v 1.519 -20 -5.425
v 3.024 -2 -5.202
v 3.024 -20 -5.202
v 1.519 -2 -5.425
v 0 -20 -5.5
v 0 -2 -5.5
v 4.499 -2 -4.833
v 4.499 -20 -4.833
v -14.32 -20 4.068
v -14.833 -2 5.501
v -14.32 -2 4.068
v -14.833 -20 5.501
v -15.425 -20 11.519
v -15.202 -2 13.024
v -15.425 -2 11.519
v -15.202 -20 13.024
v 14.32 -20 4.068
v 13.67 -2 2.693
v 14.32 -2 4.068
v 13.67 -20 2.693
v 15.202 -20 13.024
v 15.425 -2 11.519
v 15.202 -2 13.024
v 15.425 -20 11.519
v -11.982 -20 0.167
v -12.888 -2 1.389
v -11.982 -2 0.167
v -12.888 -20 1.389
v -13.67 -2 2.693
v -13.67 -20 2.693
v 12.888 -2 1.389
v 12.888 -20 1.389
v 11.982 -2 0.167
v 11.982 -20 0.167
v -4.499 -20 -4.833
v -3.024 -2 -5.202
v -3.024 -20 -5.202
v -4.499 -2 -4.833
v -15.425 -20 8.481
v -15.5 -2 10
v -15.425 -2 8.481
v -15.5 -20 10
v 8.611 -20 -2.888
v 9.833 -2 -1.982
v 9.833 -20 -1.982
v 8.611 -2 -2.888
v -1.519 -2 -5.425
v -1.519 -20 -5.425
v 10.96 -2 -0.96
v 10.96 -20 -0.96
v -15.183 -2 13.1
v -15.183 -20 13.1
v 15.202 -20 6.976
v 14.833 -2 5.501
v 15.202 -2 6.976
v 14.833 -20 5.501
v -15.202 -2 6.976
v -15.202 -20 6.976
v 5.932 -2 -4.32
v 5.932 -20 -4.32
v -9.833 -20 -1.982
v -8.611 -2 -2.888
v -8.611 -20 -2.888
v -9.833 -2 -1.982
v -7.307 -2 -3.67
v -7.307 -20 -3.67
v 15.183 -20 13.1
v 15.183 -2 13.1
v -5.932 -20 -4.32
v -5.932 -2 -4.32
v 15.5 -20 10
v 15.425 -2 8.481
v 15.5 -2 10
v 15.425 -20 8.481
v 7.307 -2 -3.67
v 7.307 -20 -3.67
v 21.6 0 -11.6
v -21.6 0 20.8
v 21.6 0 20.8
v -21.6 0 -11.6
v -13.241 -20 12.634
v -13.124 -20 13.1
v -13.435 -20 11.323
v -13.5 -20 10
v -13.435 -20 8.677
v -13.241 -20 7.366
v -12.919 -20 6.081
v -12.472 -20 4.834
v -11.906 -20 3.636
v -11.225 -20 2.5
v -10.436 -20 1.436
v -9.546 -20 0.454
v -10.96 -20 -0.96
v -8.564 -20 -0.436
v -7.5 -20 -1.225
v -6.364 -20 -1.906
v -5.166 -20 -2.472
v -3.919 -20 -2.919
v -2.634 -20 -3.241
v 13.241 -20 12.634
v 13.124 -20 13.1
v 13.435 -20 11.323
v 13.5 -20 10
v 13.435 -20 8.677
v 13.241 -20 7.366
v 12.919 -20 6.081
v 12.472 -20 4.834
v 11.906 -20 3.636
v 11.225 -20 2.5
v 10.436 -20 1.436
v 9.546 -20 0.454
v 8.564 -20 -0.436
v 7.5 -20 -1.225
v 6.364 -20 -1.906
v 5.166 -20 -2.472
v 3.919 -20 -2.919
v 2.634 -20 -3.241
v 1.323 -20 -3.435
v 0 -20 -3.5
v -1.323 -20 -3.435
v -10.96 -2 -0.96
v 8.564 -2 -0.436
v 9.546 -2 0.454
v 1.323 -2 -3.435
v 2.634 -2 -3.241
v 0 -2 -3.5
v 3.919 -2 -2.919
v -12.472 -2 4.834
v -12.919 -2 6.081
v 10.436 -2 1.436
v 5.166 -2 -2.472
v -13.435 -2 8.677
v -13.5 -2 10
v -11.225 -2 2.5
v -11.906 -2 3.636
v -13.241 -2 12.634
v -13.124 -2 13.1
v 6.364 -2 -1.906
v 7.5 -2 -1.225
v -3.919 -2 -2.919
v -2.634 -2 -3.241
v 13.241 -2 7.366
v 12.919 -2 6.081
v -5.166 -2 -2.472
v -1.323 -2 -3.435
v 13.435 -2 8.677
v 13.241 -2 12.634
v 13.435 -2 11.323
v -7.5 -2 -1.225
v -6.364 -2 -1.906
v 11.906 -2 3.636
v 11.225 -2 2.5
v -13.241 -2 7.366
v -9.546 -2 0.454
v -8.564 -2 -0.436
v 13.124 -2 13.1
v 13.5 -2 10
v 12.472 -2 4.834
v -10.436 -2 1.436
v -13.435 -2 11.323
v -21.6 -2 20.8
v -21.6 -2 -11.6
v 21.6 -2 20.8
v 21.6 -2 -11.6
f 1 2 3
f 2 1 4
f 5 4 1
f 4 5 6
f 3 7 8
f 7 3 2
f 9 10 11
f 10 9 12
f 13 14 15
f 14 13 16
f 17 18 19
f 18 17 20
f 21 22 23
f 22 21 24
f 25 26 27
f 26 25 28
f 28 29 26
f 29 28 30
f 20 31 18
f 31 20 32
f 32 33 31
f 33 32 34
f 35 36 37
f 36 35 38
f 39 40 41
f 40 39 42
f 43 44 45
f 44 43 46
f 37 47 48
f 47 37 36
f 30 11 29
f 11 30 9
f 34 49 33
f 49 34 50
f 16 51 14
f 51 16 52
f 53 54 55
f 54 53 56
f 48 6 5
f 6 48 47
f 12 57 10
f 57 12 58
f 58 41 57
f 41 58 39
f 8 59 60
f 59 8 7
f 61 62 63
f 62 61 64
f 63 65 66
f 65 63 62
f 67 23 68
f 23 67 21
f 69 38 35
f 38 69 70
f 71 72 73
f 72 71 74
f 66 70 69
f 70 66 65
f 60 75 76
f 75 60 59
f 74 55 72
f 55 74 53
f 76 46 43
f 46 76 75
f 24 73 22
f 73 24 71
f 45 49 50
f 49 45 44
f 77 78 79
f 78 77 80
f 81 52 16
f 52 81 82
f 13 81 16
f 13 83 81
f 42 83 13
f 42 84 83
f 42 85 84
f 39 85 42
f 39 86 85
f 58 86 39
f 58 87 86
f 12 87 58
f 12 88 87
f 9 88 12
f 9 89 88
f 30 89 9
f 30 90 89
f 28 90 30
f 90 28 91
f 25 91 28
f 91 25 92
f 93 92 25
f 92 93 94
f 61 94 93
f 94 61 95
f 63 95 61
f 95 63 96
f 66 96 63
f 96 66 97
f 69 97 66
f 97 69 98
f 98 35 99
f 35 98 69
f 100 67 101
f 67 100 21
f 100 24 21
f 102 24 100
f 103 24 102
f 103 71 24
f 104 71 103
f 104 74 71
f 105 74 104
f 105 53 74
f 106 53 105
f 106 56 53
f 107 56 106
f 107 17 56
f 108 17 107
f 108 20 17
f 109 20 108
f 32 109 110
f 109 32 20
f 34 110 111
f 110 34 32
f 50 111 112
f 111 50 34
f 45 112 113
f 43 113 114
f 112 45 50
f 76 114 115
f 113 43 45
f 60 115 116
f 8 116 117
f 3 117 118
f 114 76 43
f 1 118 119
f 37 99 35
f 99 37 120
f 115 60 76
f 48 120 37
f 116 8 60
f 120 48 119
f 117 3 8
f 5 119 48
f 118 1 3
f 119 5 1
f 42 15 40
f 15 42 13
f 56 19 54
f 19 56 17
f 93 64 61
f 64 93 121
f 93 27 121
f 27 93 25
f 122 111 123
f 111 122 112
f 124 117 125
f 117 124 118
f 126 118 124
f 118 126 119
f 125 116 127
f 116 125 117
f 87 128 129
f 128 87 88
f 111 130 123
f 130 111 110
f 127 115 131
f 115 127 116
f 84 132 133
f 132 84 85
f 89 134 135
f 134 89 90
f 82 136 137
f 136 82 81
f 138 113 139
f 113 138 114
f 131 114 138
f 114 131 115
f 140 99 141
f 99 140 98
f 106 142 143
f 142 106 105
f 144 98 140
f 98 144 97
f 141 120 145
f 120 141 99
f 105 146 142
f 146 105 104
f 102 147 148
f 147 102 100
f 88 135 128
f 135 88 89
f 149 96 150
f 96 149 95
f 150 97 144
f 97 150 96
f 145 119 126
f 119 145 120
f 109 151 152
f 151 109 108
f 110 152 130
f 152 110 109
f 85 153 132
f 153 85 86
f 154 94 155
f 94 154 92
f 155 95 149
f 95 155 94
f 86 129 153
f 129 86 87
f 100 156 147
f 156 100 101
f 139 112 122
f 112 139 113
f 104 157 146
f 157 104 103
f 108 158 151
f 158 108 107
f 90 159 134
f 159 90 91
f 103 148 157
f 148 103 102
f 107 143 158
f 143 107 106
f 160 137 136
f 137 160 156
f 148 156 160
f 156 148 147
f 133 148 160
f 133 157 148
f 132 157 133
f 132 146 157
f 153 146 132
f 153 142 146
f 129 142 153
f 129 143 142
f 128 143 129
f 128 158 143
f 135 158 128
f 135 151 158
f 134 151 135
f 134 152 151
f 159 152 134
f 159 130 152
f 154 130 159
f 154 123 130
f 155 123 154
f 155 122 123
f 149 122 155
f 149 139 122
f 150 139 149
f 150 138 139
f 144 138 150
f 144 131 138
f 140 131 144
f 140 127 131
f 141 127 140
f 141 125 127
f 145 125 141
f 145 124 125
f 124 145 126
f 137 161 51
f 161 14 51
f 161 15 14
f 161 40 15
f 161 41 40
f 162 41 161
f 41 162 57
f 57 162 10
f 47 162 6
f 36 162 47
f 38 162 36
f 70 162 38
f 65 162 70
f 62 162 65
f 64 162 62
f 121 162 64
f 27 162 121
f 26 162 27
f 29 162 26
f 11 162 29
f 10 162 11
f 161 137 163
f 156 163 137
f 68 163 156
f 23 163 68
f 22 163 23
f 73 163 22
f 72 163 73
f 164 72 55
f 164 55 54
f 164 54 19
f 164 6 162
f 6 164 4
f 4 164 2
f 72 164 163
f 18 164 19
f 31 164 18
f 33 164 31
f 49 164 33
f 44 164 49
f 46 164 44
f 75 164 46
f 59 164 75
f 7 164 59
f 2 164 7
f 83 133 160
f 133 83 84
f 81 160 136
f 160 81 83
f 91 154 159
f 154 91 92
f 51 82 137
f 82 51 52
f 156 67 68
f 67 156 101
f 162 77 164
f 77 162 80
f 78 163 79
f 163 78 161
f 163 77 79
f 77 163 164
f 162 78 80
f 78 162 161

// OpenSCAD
/* [Design] */
// Internal diameter for the mount
inner_diameter = 27;
// The thickness of the outer wall
thickness = 2;
// The total height of the mount
height = 20;
// If we must cut at "top" of the circle, to facilitate passing objects over it
top_cut = true;

$fn = 64;

module circular_mount() {
    _cut_width = inner_diameter+(2*thickness);
    _cut_height = height+thickness;
    _plate_height = inner_diameter * 1.2;
    _plate_width = inner_diameter * 1.6;
    union() {
        difference() {
            cylinder(h=height, d=inner_diameter + (2*thickness));
            translate([0, 0, thickness])
                cylinder(h=height, d=inner_diameter);
            if(top_cut) {
                translate([-(_cut_width*1.1), -(_cut_width/2), -0.01])
                cube([_cut_width, _cut_width, _cut_height]);
            }
        }
        translate([ -_plate_height/3, -_plate_width/2, 0])
        cube([_plate_height, _plate_width, thickness]);
    }
}

translate([0, 0, height/2]) rotate([0, 90, -90])
circular_mount();
